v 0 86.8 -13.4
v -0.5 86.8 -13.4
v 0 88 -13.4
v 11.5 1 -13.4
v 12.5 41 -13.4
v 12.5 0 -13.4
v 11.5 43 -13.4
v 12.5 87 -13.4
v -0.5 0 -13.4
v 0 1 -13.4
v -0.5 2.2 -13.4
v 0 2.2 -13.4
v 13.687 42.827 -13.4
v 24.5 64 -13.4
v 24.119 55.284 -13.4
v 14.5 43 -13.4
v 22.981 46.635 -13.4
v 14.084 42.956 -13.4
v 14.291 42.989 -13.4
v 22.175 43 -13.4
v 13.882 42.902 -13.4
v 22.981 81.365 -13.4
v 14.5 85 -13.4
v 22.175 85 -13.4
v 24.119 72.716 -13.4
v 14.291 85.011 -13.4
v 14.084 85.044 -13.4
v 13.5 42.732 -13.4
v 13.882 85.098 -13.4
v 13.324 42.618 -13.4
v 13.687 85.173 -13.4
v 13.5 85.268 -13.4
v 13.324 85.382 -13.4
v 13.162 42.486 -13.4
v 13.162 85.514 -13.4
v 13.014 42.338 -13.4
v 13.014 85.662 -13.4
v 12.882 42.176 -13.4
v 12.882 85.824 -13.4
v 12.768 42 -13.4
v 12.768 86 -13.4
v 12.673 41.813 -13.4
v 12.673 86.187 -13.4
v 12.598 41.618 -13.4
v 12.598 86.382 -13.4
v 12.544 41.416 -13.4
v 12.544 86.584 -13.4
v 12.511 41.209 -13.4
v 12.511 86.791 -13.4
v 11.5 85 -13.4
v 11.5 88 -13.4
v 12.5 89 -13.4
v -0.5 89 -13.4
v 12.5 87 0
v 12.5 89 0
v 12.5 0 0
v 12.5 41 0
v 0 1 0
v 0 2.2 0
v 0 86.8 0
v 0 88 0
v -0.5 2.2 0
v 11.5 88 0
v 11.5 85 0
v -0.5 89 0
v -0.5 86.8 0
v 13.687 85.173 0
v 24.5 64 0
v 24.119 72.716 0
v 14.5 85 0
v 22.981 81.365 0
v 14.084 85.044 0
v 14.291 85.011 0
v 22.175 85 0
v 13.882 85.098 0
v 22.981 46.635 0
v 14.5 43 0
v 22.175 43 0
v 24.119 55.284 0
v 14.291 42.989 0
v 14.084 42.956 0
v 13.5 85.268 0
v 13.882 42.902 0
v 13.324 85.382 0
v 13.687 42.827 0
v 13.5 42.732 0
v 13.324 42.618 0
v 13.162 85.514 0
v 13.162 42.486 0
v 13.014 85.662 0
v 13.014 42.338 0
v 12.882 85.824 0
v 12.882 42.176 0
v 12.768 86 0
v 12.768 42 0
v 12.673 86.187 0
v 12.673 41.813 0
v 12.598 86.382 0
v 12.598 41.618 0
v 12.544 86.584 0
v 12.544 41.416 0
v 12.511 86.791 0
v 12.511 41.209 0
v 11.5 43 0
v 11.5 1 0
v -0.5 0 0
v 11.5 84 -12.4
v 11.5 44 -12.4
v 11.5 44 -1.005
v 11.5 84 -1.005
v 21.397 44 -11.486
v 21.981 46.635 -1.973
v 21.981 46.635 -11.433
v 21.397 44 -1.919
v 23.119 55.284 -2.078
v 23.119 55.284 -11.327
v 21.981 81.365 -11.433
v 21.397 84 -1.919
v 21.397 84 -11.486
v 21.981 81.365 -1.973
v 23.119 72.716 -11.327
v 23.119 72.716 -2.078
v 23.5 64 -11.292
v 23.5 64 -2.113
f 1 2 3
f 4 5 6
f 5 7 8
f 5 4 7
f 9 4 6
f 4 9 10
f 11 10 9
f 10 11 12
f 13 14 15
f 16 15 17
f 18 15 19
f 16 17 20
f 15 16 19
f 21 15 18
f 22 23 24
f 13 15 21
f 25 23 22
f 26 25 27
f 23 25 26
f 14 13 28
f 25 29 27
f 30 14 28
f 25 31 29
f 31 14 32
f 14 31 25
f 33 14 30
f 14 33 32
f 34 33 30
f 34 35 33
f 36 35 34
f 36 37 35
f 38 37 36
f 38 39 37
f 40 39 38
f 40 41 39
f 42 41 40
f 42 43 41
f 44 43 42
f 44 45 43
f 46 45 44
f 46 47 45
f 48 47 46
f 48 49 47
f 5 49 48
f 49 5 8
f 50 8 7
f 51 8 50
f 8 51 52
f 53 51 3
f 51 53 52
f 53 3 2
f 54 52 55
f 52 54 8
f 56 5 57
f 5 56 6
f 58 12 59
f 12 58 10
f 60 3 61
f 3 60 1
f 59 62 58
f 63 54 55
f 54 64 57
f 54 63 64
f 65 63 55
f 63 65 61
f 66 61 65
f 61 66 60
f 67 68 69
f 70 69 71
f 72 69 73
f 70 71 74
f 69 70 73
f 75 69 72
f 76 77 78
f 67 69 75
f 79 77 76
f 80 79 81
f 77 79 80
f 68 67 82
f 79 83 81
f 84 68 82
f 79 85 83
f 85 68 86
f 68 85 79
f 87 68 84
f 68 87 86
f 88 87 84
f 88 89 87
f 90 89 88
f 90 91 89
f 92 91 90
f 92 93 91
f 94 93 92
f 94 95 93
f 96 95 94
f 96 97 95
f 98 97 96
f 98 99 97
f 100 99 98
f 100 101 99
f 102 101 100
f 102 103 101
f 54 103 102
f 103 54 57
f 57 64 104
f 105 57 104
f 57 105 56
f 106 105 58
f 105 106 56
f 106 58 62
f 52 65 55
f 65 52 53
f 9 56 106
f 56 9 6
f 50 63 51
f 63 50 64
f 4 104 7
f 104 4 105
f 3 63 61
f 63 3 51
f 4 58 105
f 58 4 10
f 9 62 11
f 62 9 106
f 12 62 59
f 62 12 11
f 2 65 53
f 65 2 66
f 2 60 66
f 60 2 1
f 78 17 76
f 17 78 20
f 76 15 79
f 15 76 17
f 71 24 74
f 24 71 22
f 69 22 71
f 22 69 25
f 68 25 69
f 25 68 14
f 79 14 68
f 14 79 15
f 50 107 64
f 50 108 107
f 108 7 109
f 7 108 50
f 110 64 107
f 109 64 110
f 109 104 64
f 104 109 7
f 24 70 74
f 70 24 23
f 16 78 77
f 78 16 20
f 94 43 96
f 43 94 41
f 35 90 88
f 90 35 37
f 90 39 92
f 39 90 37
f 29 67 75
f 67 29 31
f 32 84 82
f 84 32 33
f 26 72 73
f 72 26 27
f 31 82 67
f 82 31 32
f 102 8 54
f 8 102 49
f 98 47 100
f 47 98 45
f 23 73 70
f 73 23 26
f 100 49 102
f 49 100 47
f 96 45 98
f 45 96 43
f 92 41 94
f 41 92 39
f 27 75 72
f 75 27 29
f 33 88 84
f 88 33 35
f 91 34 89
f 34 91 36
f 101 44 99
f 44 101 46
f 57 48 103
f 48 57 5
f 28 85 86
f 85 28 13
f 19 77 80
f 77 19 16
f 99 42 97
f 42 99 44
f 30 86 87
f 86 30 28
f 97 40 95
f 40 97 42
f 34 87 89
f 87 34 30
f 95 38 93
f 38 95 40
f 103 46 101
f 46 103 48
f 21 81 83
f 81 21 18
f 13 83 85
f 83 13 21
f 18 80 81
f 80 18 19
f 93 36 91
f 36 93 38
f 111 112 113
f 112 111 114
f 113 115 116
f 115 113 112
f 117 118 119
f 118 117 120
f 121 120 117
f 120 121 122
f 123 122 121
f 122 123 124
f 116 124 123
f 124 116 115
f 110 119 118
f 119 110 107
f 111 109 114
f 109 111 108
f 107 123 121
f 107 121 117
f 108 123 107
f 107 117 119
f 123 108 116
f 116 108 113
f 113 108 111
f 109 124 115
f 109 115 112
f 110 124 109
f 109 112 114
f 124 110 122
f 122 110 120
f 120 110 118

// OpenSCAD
// [FL_INDEX: keywords="openscad, 3d_parametric, Customisable_switch_cover, csg_solid" | COT="Parametric OpenSCAD design from 3DCodeverse"]
// Title: Customisable switch cover

// Switch cover
// Paul Murrin - Sept 2013

// (mm)
HeightOfSocket = 87;
// (mm) 
DepthOfSocket = 11.5;
// (mm)
HeightToBottomOfSwitch = 48;
// (mm)
WidthOfSwitch = 10;
// (mm)
DepthOfSwitch = 5;
// The clip helps to grip the switch plate. If not possible, use blue tack.
IncludeClips = true;

/* [Hidden] */

Thickness = 1;			// Thickness of cover
WidthExtraMargin = 0.5;	// Additional tolerance on width of cover.
Taper = 1.2;				// Amount which switch cover tapers (helps make it printable without massive overhang)
ClipLength = Thickness + 1.2;	// Length of clip that helps hold it on 
ClipThickness = 0.5;
WidthAtBase = WidthOfSwitch + 2*WidthExtraMargin + 2*Taper;
HeightOfCover=DepthOfSwitch+7;	// Height of the inside of the cover
LengthOfCover=40;	// Length of the inside of the cover
HeightToStartOfCover = HeightToBottomOfSwitch - 5 - Thickness;
FilletRadius = 2;
$fa=5;



rotate([0,90,0])
	union()
	{
		// Main body and cutout
		difference()
		{
			cube([WidthAtBase, HeightOfSocket+2*Thickness, DepthOfSocket + Thickness]);
			translate([0,Thickness,0])
				cube([WidthAtBase, HeightOfSocket, DepthOfSocket]);
			// Cutout for coverplate
			translate([0,Thickness + HeightToStartOfCover,DepthOfSocket])
				cube([WidthAtBase, LengthOfCover+2*Thickness, Thickness]);
		}
	
		// Clips to grip coverplate
		if (IncludeClips)
		{
			translate([0,0,-ClipThickness])
				cube([WidthAtBase, ClipLength, ClipThickness]);
			translate([0,HeightOfSocket+2*Thickness-ClipLength,-ClipThickness])
				cube([WidthAtBase, ClipLength, ClipThickness]);
		}
	
		
		// Cover bulge
		translate([0,HeightToStartOfCover+Thickness,DepthOfSocket])
		{
			difference()
			{
				union()
				{
					intersection()
					{
						translate([0,LengthOfCover/2+Thickness,(HeightOfCover+Thickness)-100])
							rotate([0,90,0])
								cylinder(r=100, h=WidthAtBase);
						cube([WidthAtBase,LengthOfCover+2*Thickness,HeightOfCover+Thickness]);
					}
					// Fillet at top
					translate([0,LengthOfCover+2*Thickness,Thickness])
						difference()
						{	
							cube([WidthAtBase,FilletRadius,FilletRadius]);
							translate([-0.01,FilletRadius,FilletRadius])	
								rotate([0,90,0])
									cylinder(r=FilletRadius, h=WidthAtBase+0.02, $fn=60);
						}
					// Fillet at bottom
					translate([0,-FilletRadius,Thickness])
						difference()
						{	
							cube([WidthAtBase,FilletRadius,FilletRadius]);
							#translate([-0.01,0,FilletRadius])	
								rotate([0,90,0])
									cylinder(r=FilletRadius, h=WidthAtBase+0.02, $fn=60);
						}
	
				}
				// Taper the cover
/*				translate([WidthAtBase,-FilletRadius, 0])
					rotate([0,-atan2(Taper, HeightOfCover+Thickness),0])
						cube([Taper,LengthOfCover+2*Thickness+2*FilletRadius,HeightOfCover+Thickness+10]);
				translate([-Taper,-FilletRadius, 0])
					rotate([0,atan2(Taper, HeightOfCover+Thickness),0])
						cube([Taper,LengthOfCover+2*Thickness+2*FilletRadius,HeightOfCover+Thickness+10]);
*/		
				// Cutout inside of cover
				difference()
				{
					intersection()
					{
						translate([Thickness,(LengthOfCover/2)+Thickness,HeightOfCover-100])
							rotate([0,90,0])
								cylinder(r=100, h=WidthAtBase);
						translate([Thickness,Thickness, 0])
							cube([WidthAtBase-2*Thickness,LengthOfCover,HeightOfCover]);
					}
					// Taper the cover
					translate([WidthAtBase-Thickness,Thickness, 0])
						rotate([0,-atan2(Taper, HeightOfCover+Thickness),0])
							cube([Taper,LengthOfCover,HeightOfCover+10]);
					translate([Thickness-Taper,Thickness, 0])
						rotate([0,atan2(Taper, HeightOfCover+Thickness),0])
							cube([Taper,LengthOfCover,HeightOfCover+10]);
				}
		
			}
		}
	
	}
